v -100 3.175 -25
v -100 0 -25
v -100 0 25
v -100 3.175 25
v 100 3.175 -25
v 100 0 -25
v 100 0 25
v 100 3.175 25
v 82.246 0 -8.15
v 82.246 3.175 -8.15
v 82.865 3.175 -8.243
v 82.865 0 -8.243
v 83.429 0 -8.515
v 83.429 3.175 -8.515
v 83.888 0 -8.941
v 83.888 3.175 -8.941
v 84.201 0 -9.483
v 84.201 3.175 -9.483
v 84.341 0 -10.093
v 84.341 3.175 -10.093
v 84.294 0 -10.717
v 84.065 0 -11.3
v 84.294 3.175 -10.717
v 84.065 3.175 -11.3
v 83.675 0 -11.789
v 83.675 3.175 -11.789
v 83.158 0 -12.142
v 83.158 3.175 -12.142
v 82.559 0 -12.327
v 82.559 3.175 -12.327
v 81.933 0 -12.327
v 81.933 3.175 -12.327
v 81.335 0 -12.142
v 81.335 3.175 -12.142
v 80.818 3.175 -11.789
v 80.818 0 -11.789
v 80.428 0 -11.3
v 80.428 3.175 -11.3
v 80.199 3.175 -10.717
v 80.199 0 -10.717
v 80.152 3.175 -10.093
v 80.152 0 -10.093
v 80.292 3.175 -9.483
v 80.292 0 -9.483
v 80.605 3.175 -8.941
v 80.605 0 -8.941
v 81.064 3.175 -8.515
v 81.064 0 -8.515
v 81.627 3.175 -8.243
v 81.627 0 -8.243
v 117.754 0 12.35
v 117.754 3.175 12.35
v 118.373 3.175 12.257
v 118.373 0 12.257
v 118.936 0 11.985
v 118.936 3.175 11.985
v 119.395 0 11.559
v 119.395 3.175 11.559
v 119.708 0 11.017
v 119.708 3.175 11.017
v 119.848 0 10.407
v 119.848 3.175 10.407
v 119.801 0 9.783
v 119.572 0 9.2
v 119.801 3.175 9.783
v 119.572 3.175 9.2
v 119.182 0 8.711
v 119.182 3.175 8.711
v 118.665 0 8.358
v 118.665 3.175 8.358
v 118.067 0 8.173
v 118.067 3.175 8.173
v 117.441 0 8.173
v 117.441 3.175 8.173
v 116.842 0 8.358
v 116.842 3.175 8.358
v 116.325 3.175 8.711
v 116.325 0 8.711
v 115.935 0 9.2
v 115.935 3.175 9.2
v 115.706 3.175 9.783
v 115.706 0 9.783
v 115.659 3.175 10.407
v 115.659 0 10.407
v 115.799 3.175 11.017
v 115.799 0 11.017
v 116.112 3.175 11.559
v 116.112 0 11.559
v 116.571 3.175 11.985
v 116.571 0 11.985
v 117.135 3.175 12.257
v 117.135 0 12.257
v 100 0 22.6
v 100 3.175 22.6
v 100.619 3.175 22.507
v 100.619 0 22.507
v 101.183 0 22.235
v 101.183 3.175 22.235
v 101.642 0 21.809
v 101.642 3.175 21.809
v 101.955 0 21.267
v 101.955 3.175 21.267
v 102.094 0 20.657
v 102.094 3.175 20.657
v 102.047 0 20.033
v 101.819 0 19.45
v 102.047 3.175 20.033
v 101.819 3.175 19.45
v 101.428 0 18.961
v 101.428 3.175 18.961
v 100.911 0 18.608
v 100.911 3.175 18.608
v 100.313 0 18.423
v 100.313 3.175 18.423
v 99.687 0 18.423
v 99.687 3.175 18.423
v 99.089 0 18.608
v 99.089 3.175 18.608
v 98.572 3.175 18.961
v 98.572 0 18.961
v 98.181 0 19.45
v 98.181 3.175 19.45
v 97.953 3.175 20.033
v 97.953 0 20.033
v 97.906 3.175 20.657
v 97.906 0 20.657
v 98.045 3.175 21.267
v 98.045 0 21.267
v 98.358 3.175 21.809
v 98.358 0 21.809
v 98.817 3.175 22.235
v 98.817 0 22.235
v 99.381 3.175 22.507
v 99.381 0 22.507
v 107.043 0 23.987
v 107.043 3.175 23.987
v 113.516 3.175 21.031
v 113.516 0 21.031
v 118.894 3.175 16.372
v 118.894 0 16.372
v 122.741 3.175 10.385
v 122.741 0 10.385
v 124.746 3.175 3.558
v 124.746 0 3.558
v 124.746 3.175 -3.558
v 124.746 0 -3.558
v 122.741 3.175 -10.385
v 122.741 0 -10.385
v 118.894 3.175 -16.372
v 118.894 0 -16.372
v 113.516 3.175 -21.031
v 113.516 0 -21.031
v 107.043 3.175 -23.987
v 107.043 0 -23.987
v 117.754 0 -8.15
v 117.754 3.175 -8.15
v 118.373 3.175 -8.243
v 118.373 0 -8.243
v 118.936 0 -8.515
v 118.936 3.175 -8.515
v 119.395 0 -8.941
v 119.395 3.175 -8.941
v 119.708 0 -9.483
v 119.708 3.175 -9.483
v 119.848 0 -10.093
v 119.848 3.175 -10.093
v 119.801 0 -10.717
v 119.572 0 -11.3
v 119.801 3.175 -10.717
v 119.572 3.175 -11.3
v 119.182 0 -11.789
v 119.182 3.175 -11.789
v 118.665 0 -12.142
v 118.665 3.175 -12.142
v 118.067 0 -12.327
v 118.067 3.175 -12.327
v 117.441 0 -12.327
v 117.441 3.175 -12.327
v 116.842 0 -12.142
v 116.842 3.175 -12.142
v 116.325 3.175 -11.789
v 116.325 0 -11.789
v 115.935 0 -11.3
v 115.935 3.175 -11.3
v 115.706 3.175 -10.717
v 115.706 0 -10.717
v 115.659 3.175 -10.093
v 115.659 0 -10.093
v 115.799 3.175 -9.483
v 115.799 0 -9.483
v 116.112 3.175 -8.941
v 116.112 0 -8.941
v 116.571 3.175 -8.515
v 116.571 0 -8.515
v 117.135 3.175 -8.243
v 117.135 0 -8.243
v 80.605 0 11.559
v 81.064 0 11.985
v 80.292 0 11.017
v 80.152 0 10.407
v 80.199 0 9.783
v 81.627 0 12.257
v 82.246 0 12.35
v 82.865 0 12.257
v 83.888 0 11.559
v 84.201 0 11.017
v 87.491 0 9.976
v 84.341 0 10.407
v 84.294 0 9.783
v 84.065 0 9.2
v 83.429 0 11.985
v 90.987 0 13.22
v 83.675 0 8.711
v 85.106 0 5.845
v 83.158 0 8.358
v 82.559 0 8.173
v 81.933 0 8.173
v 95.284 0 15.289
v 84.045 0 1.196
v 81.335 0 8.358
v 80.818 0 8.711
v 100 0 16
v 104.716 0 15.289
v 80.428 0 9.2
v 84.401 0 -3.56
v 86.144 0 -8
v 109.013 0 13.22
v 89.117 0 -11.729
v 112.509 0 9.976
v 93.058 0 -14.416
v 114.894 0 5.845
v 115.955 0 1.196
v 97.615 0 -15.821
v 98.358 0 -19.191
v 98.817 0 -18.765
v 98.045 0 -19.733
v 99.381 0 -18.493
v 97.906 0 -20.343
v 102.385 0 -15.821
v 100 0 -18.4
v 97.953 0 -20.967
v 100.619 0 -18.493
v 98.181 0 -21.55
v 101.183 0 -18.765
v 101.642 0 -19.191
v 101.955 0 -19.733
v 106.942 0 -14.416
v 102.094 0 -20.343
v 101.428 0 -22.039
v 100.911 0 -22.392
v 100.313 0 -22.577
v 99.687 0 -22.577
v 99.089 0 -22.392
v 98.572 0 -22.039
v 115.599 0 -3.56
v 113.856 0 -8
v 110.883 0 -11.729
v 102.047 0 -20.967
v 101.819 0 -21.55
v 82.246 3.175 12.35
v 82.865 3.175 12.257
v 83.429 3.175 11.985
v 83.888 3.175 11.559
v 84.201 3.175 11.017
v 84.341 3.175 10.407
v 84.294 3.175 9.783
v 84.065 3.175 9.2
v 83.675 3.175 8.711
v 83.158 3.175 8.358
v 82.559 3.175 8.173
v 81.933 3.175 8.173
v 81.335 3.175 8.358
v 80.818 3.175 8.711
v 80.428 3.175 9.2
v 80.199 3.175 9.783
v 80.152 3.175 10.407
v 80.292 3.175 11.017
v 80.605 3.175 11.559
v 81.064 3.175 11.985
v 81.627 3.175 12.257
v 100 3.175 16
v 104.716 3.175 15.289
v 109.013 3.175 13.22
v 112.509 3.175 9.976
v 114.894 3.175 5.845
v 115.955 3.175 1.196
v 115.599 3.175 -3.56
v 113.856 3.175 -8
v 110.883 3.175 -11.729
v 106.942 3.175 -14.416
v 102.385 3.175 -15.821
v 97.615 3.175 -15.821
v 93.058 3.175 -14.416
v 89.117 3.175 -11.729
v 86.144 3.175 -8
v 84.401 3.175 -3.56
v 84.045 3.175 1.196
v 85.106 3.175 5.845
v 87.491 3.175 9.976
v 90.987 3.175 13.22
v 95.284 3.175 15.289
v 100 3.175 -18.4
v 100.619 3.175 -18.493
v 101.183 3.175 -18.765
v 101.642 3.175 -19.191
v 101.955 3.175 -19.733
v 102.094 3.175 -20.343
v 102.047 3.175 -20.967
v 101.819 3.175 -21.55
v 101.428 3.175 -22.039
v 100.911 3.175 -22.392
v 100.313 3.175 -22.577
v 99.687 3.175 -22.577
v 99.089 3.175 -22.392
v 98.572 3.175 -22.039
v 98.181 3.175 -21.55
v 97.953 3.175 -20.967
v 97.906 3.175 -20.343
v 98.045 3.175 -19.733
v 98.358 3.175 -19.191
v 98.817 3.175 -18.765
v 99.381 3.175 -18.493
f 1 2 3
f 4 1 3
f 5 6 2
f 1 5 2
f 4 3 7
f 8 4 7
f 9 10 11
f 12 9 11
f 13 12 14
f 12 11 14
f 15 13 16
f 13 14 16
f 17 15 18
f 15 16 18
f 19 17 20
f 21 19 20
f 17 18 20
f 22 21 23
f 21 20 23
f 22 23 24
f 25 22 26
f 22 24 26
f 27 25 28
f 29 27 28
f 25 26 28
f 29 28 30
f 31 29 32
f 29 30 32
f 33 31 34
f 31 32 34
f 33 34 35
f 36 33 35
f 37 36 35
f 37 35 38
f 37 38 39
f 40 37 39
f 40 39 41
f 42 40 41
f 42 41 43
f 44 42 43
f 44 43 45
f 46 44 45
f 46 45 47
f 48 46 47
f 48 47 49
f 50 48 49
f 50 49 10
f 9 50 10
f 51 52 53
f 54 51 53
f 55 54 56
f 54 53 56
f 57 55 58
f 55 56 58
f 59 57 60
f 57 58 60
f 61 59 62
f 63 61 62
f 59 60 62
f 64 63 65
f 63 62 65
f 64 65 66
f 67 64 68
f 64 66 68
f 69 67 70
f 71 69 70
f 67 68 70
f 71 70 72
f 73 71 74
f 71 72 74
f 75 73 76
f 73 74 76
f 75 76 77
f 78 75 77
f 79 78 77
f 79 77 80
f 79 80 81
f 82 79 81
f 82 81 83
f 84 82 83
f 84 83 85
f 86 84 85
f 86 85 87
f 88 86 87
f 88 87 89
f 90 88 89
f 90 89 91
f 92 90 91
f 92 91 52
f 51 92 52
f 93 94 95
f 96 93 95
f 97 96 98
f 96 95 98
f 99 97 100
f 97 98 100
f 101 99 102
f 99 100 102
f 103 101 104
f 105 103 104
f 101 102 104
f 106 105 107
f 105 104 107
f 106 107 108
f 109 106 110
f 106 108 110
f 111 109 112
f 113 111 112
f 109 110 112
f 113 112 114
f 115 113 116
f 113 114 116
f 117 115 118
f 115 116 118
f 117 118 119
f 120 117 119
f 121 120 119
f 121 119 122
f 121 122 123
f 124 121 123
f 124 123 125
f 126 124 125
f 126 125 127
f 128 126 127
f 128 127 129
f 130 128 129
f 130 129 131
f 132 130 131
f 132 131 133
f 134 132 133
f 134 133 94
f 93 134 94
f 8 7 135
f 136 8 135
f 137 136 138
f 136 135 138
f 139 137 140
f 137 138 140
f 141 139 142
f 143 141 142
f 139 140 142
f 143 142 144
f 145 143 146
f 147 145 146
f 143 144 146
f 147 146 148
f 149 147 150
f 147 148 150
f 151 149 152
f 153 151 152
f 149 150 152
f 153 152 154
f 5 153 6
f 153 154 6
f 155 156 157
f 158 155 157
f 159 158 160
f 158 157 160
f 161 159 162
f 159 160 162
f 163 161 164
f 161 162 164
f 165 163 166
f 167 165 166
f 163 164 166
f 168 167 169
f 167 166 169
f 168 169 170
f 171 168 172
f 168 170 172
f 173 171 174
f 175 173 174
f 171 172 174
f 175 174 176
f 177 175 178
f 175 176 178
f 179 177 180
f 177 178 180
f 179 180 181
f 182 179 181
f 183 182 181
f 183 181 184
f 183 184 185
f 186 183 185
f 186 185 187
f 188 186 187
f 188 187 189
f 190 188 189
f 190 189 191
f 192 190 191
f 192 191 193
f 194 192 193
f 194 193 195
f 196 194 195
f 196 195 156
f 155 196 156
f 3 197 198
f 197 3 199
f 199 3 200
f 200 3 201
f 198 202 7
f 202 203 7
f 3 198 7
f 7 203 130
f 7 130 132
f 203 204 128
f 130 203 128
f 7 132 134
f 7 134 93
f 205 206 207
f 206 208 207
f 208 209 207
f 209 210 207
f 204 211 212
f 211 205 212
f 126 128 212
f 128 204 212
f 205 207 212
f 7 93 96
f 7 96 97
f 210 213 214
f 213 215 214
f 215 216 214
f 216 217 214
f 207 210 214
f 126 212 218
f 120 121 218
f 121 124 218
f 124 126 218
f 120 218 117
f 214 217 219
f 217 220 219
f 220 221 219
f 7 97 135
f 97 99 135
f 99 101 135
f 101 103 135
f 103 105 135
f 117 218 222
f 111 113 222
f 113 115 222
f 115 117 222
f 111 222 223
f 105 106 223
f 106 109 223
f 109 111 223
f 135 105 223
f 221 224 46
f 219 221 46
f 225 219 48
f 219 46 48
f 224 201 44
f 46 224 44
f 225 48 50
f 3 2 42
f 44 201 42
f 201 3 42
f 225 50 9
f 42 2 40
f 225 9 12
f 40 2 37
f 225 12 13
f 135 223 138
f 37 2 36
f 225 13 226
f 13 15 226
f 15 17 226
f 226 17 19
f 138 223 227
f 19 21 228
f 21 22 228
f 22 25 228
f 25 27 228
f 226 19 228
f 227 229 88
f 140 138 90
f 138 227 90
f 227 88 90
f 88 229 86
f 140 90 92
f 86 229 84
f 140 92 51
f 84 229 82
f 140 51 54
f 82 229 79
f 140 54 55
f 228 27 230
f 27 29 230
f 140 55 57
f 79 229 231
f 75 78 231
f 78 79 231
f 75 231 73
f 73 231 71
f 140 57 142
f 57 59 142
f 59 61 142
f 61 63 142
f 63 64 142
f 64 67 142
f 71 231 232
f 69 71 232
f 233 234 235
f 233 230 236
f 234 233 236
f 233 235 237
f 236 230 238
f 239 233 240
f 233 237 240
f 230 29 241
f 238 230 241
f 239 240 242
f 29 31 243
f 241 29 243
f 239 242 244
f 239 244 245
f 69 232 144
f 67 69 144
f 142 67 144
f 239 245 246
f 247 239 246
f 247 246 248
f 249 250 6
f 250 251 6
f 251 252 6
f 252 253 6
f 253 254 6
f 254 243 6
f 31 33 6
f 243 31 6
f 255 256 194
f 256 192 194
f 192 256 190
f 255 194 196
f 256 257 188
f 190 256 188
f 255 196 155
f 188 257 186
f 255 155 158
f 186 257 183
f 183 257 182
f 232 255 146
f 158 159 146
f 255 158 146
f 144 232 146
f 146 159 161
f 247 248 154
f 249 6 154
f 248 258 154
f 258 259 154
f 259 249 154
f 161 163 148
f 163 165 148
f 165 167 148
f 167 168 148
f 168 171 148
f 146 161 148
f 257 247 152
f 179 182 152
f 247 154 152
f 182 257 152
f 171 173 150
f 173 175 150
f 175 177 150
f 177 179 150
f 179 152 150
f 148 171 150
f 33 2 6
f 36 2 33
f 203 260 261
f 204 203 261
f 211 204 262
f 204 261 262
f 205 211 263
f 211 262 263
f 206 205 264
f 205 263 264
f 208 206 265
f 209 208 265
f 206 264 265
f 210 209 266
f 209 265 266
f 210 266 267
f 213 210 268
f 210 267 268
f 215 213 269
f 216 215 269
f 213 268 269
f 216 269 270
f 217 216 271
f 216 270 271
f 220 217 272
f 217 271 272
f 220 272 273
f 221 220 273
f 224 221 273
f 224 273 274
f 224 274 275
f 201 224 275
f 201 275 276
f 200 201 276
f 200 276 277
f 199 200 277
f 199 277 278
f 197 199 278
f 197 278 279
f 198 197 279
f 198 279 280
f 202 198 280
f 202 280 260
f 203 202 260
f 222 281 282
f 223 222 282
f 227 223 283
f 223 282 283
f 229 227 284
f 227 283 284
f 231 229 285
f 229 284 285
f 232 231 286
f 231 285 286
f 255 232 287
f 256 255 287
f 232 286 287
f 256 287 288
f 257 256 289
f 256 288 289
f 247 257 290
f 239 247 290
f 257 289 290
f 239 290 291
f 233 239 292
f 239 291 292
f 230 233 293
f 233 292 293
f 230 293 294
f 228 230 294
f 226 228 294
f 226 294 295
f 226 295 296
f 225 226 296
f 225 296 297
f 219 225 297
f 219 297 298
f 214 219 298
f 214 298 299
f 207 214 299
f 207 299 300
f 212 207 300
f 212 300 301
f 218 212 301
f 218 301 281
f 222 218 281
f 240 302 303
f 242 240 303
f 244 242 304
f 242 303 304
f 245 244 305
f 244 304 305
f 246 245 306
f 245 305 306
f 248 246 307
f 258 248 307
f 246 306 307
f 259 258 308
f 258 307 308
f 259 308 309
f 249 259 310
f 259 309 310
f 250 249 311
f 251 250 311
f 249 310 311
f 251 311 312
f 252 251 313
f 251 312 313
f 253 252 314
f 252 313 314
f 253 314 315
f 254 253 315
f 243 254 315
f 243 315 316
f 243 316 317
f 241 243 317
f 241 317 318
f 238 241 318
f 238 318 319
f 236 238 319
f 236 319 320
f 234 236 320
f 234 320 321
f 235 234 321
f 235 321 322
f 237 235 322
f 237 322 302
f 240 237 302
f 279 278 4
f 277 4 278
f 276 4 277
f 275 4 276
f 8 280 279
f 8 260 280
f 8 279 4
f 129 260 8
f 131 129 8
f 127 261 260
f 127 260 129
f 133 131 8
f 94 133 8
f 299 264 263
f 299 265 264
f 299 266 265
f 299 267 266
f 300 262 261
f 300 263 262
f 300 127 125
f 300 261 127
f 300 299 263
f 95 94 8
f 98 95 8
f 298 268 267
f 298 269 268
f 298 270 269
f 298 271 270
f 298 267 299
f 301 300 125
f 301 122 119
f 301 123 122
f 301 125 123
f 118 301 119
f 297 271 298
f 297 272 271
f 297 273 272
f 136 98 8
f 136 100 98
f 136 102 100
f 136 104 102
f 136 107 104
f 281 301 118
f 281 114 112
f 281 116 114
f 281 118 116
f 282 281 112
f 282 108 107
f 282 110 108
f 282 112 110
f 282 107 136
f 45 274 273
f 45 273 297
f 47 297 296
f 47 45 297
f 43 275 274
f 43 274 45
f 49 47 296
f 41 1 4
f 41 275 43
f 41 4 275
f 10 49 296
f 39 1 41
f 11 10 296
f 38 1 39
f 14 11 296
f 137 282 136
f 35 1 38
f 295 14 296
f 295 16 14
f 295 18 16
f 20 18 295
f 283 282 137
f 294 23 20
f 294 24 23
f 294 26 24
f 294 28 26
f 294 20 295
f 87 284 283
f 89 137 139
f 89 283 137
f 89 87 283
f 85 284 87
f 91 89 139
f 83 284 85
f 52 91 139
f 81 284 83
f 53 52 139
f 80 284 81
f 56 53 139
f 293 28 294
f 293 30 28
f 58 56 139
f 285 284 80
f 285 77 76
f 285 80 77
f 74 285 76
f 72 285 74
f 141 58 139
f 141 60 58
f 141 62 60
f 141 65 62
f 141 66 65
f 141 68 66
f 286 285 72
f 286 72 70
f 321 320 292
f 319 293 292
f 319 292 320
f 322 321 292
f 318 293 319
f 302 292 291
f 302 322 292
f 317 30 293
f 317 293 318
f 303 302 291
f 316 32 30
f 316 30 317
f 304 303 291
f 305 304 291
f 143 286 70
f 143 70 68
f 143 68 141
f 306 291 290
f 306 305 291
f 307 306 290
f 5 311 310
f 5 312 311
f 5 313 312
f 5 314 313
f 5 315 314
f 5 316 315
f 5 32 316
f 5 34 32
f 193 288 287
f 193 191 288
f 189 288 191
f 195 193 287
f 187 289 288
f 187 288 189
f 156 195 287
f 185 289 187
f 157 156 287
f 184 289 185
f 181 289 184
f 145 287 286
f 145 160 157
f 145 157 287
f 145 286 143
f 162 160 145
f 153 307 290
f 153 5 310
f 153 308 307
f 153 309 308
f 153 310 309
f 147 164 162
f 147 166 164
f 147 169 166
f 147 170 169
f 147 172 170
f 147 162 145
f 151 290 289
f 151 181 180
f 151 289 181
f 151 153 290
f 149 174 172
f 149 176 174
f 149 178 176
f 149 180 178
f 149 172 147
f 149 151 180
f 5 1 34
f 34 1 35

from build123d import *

# Parameters (mm, degrees)
BOSS_EXTRUDE1_DEPTH = 3.175
SKETCH2_R           = 16
SKETCH2_R_2         = 2.1
CUT_EXTRUDE1_DEPTH  = 128.515021174


with BuildPart() as part:
    # Sketch1 → Boss-Extrude1 (new body)
    with BuildSketch(Plane(origin=(0, 0, 0), x_dir=(1, 0, 0), z_dir=(0, 1, 0))):
        with BuildLine():
            Line((-100, -25), (100, -25))
            ThreePointArc((100, -25), (125, 0), (100, 25))
            Line((100, 25), (-100, 25))
            Line((-100, 25), (-100, -25))
        make_face()
    extrude(amount=BOSS_EXTRUDE1_DEPTH)

    # Sketch2 → Cut-Extrude1 (cut, through all)
    with BuildSketch(Plane(origin=(0, 3.175, 0), x_dir=(1, 0, 0), z_dir=(0, 1, 0))):
        with Locations(Location((100, 0, 0), (0, 0, 270))):
            Circle(SKETCH2_R)
        with Locations(Location((100, 20.5, 0), (0, 0, 270))):
            Circle(SKETCH2_R_2)
        with Locations(Location((117.753520778, 10.25, 0), (0, 0, 270))):
            Circle(SKETCH2_R_2)
        with Locations(Location((117.753520778, -10.25, 0), (0, 0, 270))):
            Circle(SKETCH2_R_2)
        with Locations(Location((100, -20.5, 0), (0, 0, 270))):
            Circle(SKETCH2_R_2)
        with Locations(Location((82.246479222, -10.25, 0), (0, 0, 270))):
            Circle(SKETCH2_R_2)
        with Locations(Location((82.246479222, 10.25, 0), (0, 0, 270))):
            Circle(SKETCH2_R_2)
    extrude(amount=-CUT_EXTRUDE1_DEPTH, mode=Mode.SUBTRACT)


solid = part.part
